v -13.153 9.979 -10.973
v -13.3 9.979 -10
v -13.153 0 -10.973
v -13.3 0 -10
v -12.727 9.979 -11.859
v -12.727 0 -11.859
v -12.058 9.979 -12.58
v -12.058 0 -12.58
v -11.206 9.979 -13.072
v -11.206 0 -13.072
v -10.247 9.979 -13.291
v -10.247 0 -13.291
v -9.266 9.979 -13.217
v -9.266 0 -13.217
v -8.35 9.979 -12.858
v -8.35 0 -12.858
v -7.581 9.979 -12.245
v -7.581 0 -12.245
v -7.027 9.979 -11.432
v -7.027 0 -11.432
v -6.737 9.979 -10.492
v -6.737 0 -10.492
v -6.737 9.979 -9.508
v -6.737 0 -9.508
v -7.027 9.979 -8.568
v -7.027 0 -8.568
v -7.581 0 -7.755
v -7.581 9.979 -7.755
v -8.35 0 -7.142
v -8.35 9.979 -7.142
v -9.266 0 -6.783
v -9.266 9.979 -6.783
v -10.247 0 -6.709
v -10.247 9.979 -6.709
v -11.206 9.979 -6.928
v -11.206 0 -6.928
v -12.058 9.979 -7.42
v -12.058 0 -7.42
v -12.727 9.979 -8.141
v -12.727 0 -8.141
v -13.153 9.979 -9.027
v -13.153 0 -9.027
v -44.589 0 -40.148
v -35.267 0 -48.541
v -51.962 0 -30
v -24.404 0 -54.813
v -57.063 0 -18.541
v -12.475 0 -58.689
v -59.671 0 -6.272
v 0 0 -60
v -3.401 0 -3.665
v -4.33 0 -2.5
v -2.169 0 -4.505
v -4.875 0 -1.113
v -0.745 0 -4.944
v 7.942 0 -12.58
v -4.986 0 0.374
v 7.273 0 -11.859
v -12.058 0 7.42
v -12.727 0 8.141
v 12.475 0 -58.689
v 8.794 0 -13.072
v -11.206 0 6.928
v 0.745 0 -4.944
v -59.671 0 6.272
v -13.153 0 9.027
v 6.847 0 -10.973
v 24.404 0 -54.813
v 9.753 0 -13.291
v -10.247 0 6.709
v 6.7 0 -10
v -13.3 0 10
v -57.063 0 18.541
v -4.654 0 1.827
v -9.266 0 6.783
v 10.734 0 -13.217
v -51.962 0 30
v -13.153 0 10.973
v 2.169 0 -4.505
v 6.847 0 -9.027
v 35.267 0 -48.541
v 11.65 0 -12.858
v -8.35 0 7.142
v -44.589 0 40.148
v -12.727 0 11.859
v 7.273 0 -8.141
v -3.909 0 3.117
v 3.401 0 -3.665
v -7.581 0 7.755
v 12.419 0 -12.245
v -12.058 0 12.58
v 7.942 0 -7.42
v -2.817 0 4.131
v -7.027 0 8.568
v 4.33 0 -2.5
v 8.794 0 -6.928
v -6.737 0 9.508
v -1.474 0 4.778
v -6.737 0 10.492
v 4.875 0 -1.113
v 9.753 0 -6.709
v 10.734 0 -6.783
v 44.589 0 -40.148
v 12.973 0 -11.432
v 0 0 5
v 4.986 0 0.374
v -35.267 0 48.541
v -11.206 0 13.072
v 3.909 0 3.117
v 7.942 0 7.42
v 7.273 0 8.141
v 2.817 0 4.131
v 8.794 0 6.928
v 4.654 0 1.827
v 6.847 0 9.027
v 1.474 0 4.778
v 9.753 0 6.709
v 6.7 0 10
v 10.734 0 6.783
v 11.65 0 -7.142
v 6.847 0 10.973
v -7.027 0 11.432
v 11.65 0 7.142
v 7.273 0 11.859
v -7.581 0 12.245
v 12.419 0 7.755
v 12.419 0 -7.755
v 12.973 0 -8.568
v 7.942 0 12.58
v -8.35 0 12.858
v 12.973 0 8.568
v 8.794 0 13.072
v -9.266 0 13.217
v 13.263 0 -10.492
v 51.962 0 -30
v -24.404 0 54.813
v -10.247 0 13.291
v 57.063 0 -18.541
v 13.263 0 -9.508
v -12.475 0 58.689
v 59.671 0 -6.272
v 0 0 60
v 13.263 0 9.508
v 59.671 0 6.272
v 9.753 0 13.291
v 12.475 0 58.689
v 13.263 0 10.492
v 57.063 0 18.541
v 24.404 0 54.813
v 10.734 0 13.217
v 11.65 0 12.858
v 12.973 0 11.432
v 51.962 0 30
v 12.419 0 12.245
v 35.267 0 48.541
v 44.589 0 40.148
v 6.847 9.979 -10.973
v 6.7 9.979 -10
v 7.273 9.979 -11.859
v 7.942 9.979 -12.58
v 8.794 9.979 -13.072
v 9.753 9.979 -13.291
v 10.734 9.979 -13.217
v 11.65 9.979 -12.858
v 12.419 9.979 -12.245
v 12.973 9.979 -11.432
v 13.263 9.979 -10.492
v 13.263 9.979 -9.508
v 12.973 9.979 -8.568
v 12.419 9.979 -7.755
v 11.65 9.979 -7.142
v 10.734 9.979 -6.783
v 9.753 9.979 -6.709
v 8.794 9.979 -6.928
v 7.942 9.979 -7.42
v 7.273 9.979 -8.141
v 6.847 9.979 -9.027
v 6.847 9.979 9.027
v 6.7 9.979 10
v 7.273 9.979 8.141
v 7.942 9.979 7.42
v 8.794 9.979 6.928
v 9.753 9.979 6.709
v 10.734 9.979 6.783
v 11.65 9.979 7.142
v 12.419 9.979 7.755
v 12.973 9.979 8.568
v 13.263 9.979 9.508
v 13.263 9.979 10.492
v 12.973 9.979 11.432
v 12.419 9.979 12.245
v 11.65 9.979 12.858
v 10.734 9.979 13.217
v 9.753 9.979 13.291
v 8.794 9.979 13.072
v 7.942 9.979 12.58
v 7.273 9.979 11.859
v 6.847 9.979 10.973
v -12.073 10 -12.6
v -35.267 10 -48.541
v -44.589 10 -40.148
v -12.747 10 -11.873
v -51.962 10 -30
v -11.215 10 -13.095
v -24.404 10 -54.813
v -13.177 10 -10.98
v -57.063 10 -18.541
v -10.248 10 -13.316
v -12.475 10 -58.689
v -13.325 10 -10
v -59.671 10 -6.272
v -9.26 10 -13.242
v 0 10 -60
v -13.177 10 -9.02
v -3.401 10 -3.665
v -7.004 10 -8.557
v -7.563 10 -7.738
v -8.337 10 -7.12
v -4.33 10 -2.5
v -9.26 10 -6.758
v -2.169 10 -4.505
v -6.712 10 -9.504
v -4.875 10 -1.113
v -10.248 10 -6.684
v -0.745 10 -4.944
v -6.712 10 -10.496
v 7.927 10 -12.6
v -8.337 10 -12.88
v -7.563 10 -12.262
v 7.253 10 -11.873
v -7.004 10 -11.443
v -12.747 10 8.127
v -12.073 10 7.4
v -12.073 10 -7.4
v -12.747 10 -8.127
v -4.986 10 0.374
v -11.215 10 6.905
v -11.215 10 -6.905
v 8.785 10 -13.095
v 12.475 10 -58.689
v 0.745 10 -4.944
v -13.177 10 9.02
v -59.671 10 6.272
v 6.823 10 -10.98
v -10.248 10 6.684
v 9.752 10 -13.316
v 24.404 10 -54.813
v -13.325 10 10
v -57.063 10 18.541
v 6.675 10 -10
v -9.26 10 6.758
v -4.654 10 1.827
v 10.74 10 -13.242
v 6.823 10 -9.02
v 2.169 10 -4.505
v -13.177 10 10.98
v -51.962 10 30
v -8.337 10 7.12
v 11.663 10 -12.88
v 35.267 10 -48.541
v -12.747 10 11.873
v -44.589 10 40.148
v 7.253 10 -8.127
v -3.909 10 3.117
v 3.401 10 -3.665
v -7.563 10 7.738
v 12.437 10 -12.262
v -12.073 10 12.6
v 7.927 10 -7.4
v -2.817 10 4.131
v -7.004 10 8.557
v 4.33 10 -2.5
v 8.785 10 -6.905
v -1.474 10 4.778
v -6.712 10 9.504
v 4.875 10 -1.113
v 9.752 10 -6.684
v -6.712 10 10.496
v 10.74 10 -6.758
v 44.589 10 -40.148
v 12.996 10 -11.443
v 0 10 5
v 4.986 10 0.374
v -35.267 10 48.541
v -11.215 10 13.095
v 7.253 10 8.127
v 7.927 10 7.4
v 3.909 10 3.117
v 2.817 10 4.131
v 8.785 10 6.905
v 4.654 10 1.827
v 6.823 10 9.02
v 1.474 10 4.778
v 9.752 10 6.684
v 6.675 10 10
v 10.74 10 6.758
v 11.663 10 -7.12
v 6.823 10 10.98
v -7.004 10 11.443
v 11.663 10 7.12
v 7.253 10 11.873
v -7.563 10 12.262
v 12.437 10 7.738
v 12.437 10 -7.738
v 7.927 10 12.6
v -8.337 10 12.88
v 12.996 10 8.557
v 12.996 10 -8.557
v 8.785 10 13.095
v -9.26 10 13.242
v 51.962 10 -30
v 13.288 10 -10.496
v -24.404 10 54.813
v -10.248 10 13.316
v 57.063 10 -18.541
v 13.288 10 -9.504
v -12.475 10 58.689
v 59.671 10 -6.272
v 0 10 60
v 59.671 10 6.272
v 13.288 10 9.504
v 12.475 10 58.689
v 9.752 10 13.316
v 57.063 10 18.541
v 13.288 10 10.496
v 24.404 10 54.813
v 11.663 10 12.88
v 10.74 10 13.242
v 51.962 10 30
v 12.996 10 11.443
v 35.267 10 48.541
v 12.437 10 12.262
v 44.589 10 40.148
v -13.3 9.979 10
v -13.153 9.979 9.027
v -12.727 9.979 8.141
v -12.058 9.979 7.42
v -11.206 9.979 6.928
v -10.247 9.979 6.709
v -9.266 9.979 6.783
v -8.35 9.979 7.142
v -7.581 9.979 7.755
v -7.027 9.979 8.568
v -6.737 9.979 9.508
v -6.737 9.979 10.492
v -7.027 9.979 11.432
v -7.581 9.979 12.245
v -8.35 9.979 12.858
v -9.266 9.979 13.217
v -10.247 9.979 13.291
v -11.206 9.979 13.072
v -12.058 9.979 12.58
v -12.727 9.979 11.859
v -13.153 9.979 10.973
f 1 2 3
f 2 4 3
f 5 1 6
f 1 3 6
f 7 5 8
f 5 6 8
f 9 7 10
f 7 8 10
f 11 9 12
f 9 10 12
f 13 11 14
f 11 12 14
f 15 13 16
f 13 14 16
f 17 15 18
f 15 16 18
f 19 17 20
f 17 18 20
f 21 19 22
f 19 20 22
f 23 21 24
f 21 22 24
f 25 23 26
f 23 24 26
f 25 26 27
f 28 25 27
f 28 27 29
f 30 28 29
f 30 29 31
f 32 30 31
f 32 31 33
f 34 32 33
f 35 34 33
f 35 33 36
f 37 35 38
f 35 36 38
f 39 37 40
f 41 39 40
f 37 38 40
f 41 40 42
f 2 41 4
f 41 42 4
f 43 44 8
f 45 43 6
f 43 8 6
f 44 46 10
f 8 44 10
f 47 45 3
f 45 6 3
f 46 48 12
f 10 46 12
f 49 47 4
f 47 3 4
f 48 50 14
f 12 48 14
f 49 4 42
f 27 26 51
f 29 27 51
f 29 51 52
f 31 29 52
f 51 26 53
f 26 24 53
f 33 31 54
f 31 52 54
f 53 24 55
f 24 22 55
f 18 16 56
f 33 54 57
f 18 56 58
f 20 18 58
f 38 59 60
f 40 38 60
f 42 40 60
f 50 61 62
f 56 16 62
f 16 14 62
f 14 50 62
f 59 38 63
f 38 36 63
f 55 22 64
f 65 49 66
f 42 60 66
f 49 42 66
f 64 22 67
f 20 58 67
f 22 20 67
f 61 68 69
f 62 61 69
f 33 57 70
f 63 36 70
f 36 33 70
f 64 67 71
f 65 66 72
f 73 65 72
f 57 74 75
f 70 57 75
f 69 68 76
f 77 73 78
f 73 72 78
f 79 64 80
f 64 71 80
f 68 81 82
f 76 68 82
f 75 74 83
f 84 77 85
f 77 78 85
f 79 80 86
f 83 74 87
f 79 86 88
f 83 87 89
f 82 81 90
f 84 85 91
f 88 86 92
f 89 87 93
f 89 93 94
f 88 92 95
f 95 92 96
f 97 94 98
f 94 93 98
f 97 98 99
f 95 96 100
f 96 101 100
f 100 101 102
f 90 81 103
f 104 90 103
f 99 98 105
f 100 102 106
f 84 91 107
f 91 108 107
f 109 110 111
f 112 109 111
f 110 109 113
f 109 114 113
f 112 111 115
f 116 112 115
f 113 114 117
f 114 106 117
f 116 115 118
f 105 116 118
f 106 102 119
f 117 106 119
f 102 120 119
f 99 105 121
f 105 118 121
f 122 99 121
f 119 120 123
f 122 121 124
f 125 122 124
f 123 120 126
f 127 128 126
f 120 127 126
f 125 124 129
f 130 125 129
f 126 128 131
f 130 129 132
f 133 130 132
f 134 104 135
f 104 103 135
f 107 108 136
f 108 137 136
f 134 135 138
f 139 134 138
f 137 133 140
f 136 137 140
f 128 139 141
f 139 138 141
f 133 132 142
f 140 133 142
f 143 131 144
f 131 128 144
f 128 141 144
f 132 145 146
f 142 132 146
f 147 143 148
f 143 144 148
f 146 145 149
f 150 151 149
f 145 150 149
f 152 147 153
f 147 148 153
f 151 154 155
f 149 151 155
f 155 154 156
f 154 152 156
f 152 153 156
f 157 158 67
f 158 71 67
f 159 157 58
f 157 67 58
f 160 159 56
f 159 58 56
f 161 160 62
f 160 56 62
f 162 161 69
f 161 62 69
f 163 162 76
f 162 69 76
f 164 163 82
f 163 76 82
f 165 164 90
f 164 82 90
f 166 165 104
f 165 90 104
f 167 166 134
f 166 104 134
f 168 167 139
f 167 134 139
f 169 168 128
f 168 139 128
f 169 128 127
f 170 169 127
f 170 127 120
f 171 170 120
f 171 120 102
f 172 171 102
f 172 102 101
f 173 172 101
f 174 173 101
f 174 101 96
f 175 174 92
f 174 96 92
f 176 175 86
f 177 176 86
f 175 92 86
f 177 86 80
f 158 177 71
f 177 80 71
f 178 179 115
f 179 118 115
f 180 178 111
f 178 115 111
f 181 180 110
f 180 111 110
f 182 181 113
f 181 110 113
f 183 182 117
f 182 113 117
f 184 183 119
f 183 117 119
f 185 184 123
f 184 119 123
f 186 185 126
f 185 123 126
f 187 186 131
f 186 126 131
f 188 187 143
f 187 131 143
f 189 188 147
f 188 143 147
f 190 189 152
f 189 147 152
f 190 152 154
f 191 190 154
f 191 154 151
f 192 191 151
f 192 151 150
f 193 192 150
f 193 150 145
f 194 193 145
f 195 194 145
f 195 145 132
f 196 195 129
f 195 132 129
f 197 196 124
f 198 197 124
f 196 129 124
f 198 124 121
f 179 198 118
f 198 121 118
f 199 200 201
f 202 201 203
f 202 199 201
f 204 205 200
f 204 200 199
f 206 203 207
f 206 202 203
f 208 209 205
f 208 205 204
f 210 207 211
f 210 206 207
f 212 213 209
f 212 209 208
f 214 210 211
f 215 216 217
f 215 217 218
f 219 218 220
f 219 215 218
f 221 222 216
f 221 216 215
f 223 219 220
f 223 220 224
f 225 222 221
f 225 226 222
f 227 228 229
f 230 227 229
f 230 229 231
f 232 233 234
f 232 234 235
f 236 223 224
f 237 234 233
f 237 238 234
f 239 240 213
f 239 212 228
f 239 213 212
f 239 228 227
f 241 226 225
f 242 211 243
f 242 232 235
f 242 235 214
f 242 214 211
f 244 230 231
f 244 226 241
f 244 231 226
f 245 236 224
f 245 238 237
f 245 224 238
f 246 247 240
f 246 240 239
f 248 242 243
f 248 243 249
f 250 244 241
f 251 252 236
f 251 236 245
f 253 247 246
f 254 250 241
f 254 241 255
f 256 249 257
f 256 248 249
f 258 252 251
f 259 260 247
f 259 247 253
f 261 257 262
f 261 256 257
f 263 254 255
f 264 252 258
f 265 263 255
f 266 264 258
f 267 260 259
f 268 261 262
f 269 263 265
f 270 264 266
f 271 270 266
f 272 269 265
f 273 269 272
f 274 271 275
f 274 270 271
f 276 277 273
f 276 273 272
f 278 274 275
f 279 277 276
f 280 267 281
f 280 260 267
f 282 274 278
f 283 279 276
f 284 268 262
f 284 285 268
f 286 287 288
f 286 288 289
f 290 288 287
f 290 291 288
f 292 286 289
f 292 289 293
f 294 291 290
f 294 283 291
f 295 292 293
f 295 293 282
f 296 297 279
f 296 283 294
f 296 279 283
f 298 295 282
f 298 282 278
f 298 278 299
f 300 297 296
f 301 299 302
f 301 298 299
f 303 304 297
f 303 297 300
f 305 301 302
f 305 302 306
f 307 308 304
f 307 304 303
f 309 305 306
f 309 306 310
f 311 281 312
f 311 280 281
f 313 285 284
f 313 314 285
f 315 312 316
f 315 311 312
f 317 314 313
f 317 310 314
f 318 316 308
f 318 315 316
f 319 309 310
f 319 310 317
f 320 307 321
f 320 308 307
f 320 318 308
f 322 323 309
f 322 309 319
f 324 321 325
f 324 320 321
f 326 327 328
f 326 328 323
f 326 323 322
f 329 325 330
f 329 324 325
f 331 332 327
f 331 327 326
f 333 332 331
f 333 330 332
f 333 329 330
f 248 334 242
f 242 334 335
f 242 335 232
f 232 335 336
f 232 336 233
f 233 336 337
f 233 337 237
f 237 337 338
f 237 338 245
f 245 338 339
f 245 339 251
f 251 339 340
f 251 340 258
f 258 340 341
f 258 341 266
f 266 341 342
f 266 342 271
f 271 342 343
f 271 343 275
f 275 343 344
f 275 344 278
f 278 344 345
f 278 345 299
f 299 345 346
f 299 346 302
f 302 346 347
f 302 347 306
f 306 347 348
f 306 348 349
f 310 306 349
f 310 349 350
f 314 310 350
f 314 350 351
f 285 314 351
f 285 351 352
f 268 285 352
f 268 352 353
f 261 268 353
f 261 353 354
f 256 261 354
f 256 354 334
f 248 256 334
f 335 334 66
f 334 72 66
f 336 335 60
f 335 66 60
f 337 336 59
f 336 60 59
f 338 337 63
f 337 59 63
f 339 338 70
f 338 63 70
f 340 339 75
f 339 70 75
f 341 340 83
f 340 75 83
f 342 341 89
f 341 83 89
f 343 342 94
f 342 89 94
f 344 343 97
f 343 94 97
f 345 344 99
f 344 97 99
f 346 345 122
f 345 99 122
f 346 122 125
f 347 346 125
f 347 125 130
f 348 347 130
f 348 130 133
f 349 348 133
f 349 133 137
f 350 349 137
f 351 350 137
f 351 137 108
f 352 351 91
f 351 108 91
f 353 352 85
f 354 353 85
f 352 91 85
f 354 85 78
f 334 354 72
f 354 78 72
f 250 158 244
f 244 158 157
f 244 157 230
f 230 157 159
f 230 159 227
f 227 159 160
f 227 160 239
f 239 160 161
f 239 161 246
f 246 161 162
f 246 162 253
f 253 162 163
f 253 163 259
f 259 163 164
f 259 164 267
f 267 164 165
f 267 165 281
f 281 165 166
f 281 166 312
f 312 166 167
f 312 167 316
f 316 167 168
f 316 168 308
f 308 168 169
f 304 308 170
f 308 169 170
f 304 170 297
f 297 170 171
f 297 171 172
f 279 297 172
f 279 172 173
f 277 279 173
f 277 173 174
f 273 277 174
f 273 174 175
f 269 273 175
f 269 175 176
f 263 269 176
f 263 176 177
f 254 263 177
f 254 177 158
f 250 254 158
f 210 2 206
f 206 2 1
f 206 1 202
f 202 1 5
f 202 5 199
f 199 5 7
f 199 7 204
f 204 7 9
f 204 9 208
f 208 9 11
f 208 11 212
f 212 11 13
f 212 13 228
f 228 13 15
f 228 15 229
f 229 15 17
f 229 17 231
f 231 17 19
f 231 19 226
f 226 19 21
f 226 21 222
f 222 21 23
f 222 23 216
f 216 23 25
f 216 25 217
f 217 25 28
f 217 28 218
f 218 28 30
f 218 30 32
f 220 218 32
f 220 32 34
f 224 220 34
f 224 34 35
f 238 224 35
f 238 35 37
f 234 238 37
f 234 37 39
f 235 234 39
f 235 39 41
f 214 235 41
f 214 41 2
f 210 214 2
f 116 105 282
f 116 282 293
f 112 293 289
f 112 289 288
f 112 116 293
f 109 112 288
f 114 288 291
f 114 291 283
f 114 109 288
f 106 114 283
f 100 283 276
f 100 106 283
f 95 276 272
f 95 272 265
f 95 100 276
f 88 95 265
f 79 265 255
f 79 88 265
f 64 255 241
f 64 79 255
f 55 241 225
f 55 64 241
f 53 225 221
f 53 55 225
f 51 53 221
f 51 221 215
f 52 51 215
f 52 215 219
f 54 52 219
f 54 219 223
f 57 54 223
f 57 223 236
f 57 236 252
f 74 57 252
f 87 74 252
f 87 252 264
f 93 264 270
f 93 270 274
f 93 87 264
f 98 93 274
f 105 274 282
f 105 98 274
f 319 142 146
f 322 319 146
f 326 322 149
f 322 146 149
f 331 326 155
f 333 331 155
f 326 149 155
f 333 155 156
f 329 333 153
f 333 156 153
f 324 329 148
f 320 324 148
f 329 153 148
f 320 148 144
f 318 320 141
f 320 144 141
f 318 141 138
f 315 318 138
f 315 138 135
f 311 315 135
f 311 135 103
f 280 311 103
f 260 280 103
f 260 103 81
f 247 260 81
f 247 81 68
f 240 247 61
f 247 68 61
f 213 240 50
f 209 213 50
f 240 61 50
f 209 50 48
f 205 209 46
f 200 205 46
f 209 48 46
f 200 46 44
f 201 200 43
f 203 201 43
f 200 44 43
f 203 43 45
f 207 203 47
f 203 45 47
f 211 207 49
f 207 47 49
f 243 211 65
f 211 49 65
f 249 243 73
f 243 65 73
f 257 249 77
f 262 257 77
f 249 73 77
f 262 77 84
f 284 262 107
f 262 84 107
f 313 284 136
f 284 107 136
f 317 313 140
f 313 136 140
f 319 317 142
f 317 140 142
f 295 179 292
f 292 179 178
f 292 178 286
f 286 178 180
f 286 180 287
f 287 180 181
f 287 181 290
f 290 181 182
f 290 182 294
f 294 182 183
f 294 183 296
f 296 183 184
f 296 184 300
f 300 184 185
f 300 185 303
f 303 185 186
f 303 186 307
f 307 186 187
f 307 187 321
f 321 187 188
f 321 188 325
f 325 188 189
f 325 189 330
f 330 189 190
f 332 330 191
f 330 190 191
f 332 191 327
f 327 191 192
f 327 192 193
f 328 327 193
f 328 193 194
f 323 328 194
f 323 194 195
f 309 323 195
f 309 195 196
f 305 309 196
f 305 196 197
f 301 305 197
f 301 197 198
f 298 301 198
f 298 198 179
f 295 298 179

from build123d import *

# Parameters (mm, degrees)
SKETCH1_R                      = 60
SKETCH1_R_2                    = 5
BOSS_EXTRUDE1_DEPTH            = 10
M6_CLEARANCE_HOLE1_D           = 6.6
M6_CLEARANCE_HOLE1_CSINK_D     = 6.65
M6_CLEARANCE_HOLE1_CSINK_ANGLE = 100


with BuildPart() as part:
    # Sketch1 → Boss-Extrude1 (new body)
    with BuildSketch(Plane(origin=(0, 0, 0), x_dir=(1, 0, 0), z_dir=(0, 1, 0))):
        with Locations(Location((0, 0, 0), (0, 0, 270))):
            Circle(SKETCH1_R)
        with Locations(Location((0, 0, 0), (0, 0, 270))):
            Circle(SKETCH1_R_2, mode=Mode.SUBTRACT)
    extrude(amount=BOSS_EXTRUDE1_DEPTH)

    # M6 Clearance Hole1 (through all)
    with Locations(Plane(origin=(0, 10, 0), x_dir=(1, 0, 0), z_dir=(0, 1, 0))):
        with Locations((-10, 10), (10, 10), (-10, -10), (10, -10)):
            CounterSinkHole(M6_CLEARANCE_HOLE1_D / 2, M6_CLEARANCE_HOLE1_CSINK_D / 2, counter_sink_angle=M6_CLEARANCE_HOLE1_CSINK_ANGLE)


solid = part.part
